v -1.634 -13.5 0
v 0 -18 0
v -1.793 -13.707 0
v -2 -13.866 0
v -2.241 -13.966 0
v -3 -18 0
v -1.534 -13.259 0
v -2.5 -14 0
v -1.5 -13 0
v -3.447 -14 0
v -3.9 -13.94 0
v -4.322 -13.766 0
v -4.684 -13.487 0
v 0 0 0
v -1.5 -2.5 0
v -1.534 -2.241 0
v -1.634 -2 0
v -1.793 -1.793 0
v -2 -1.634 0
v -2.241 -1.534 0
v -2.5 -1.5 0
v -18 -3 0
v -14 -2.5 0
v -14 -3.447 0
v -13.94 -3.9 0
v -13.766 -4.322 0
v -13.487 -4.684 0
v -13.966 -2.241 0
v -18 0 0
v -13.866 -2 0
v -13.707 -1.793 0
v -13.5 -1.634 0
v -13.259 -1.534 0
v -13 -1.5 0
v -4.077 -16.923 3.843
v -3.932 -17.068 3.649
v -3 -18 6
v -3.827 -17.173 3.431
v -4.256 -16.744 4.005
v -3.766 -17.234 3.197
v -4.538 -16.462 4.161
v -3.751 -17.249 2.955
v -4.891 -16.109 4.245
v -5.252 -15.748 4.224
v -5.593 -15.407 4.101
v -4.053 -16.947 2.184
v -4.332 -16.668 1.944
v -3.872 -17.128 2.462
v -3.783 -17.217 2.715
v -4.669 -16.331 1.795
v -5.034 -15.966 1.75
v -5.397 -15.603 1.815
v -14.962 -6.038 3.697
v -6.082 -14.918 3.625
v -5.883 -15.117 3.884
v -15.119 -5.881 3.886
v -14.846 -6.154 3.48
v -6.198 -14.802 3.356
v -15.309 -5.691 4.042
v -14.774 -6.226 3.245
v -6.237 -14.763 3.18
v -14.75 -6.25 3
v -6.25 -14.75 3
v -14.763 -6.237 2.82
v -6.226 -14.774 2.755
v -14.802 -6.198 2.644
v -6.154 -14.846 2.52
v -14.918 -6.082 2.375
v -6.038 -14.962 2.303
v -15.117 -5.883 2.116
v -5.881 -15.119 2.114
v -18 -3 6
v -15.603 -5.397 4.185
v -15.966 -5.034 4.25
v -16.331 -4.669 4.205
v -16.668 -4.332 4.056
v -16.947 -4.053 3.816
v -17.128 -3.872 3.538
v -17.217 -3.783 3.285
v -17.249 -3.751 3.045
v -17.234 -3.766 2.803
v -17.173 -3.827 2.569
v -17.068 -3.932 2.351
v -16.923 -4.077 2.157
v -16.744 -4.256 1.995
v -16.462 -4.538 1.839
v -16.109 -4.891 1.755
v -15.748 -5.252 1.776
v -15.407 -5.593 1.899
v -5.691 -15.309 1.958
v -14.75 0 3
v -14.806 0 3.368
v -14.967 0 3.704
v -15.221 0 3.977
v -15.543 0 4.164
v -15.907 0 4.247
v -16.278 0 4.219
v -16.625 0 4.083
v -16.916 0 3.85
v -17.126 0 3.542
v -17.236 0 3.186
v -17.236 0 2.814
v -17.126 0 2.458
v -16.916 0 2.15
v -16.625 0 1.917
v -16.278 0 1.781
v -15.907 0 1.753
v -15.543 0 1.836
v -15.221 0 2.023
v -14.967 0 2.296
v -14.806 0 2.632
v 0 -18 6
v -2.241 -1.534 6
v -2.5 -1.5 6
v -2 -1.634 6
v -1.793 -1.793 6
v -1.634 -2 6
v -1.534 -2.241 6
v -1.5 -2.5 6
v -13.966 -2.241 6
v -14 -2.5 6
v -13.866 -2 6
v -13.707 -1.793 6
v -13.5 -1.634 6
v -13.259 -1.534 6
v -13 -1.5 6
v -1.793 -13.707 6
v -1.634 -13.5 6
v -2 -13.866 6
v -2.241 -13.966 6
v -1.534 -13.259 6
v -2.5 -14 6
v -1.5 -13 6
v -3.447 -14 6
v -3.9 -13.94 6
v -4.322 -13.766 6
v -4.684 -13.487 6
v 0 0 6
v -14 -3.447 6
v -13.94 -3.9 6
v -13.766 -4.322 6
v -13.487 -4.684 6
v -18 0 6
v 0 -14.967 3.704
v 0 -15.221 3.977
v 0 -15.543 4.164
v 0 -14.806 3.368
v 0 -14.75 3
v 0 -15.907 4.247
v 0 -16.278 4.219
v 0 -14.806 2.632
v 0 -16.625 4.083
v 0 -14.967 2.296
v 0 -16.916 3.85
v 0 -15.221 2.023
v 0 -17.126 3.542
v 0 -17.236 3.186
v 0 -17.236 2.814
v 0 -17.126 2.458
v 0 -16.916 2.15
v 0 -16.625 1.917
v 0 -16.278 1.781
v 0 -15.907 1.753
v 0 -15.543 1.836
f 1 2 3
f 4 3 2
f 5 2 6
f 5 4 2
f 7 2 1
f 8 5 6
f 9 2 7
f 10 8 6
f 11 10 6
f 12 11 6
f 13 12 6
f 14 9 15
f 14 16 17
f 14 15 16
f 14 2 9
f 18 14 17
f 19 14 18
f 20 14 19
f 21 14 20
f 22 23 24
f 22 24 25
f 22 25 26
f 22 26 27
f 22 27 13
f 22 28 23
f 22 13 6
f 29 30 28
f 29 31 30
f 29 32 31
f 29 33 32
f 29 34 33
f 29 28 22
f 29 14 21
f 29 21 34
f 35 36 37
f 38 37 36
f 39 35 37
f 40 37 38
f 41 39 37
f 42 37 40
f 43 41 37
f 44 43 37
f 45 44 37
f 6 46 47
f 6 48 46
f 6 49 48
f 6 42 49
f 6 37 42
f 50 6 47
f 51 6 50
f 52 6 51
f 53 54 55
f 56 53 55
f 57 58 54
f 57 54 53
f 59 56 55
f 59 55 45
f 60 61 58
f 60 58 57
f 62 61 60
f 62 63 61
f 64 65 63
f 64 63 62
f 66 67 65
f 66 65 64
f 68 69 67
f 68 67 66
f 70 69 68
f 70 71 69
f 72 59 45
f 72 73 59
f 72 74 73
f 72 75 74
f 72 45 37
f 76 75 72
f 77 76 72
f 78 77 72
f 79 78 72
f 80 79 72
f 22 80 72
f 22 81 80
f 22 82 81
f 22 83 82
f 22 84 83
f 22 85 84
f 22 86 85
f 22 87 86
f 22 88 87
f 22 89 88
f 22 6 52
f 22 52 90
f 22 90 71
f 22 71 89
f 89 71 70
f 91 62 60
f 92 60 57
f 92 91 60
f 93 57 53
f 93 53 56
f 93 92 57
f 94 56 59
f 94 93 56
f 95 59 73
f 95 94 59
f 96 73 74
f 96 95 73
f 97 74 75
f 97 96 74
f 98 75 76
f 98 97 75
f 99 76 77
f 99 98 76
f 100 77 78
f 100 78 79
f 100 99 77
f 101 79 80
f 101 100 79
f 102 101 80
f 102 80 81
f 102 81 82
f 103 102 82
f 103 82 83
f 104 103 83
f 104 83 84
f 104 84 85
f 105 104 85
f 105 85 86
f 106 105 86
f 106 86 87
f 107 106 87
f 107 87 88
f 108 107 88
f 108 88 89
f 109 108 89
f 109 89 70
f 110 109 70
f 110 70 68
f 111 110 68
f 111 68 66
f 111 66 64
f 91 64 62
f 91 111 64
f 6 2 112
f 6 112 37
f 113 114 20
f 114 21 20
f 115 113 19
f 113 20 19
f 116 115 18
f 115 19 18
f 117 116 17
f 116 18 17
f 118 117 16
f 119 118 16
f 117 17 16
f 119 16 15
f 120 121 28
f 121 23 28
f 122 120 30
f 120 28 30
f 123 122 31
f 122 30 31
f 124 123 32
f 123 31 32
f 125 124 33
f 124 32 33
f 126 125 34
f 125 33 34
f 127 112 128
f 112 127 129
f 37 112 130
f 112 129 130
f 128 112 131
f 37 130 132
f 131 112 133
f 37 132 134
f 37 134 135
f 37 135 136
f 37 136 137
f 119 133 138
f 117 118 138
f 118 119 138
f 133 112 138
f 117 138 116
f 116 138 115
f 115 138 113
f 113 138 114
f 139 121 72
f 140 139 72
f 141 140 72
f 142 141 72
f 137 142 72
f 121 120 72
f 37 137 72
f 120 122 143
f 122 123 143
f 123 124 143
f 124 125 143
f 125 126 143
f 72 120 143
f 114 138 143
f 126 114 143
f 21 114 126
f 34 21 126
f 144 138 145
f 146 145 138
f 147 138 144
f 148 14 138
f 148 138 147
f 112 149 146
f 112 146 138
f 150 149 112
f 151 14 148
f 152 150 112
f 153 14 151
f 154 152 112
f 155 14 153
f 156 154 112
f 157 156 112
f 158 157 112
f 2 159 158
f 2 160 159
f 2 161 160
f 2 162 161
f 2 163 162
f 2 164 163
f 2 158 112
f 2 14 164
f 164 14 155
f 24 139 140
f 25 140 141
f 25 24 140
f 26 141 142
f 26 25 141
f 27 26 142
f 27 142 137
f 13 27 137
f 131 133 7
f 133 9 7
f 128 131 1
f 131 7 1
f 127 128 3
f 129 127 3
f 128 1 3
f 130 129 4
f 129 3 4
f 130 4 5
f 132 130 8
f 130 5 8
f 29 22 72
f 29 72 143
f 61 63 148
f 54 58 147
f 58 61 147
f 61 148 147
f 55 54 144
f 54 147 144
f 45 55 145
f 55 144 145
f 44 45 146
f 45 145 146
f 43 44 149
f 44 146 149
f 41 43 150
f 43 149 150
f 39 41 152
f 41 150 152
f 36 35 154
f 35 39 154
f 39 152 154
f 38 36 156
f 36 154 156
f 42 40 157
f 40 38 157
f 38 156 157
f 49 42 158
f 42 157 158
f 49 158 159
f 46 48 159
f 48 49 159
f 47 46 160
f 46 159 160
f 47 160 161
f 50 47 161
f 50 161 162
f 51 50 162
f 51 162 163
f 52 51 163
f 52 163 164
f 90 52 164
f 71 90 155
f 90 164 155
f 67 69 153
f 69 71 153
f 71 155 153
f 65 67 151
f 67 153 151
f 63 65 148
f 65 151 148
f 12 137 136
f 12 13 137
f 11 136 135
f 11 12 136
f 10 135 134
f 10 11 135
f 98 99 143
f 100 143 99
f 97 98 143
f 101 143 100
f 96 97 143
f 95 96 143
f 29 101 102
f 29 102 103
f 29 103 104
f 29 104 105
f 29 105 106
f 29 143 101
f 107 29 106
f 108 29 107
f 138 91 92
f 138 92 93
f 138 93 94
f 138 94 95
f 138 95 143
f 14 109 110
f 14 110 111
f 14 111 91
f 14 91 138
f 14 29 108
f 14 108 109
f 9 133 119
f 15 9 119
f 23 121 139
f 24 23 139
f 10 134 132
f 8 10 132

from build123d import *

# Parameters (mm, degrees)
EXTRUDE_1_DEPTH     = 6
CUT_EXTRUDE_1_DEPTH = 27.153393661
SKETCH_3_R          = 1.25
CUT_EXTRUDE_2_DEPTH = 27.153393661
FILLET_1_R          = 1
FILLET_2_R          = 1.75


with BuildPart() as part:
    # 草图1 → 凸台-拉伸1 (new body)
    with BuildSketch(Plane.XY):
        Polygon((-18, 0), (0, 0), (0, -18), (-3, -18), (-18, -3), align=None)
    extrude(amount=EXTRUDE_1_DEPTH)

    # 草图2 → 切除-拉伸1 (cut, through all)
    with BuildSketch(Plane.XY.offset(6)):
        Polygon((-14, -1.5), (-14, -4.171572875), (-4.171572875, -14), (-1.5, -14), (-1.5, -1.5), align=None)
    extrude(amount=-CUT_EXTRUDE_1_DEPTH, mode=Mode.SUBTRACT)

    # 草图3 → 切除-拉伸2 (cut, through all)
    with BuildSketch(Plane(origin=(0, 0, 0), x_dir=(0, 0, -1), z_dir=(1, 0, 0))):
        with Locations(Location((-3, -16, 0), (0, 0, 90))):
            Circle(SKETCH_3_R)
    cut_extrude_2 = extrude(amount=-CUT_EXTRUDE_2_DEPTH, mode=Mode.SUBTRACT)

    # 镜向1: 切除-拉伸2 across plane
    add(cut_extrude_2.mirror(Plane(origin=(0, 0, 0), x_dir=(0, 0, 1), z_dir=(-0.7071067811865476, 0.7071067811865475, 0))), mode=Mode.SUBTRACT)

    # 圆角1
    fillet_1_edges = [part.edges().sort_by_distance(p)[0] for p in [
        (-1.5, -14, 3),
        (-14, -1.5, 3),
        (-1.5, -1.5, 3),
    ]]
    fillet(fillet_1_edges, radius=FILLET_1_R)

    # 圆角2
    fillet_2_edges = [part.edges().sort_by_distance(p)[0] for p in [
        (-4.171572875, -14, 3),
        (-14, -4.171572875, 3),
    ]]
    fillet(fillet_2_edges, radius=FILLET_2_R)


solid = part.part
